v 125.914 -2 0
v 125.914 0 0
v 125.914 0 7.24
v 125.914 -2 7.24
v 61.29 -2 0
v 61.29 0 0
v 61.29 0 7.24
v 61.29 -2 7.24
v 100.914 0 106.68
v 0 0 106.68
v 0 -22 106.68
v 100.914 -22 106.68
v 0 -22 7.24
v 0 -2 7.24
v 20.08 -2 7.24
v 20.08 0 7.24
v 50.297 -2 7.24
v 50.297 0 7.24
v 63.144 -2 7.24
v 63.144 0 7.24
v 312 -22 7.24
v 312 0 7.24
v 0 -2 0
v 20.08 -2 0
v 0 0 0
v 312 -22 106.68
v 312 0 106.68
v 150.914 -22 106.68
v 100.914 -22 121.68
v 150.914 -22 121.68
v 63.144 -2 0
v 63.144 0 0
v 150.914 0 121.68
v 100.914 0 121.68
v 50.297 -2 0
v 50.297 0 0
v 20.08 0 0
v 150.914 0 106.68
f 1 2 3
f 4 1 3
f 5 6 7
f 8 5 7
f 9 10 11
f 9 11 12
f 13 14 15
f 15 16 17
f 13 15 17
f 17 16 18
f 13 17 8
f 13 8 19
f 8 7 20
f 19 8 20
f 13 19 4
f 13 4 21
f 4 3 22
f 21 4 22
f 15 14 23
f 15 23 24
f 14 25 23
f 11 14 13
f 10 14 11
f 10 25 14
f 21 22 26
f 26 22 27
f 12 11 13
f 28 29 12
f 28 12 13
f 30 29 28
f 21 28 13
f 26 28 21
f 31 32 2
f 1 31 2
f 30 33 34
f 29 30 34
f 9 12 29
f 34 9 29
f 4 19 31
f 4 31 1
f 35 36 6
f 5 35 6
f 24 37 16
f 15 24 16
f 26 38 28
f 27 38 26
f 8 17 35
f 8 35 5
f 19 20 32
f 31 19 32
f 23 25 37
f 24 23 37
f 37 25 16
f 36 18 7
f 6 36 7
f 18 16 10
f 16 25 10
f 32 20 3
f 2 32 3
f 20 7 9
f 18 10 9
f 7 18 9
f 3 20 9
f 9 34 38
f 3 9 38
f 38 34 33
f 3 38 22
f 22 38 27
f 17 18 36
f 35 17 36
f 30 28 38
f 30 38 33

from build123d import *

# Parameters (mm, degrees)
F1_DEPTH = 2
F2_W     = 312
F2_H     = 99.44
F3_DEPTH = 20
F4_W     = 50
F4_H     = 15
F5_DEPTH = 22


with BuildPart() as f1:
    # F0 (on Front) → F1 (new body)
    with BuildSketch(Plane.XZ):
        Polygon((0, 106.68), (0, 0), (20.08, 0), (20.08, 7.24), (50.296851, 7.24), (50.296851, 0), (61.29, 0), (61.29, 7.24), (63.144, 7.24), (63.144, 0), (125.914, 0), (125.914, 7.24), (312, 7.24), (312, 106.68), align=None)
    extrude(amount=F1_DEPTH)

    # F2 (on face) → F3 (join)
    with BuildSketch(Plane.XZ.offset(2)):
        with Locations((156, 56.96)):
            Rectangle(F2_W, F2_H)
    extrude(amount=F3_DEPTH)

    # F4 (on face) → F5 (join)
    with BuildSketch(Plane(origin=(0, 0, 0), x_dir=(-1, 0, 0), z_dir=(0, 1, 0))):
        with Locations((-125.914, 114.18)):
            Rectangle(F4_W, F4_H)
    extrude(amount=-F5_DEPTH)


solid = f1.part
